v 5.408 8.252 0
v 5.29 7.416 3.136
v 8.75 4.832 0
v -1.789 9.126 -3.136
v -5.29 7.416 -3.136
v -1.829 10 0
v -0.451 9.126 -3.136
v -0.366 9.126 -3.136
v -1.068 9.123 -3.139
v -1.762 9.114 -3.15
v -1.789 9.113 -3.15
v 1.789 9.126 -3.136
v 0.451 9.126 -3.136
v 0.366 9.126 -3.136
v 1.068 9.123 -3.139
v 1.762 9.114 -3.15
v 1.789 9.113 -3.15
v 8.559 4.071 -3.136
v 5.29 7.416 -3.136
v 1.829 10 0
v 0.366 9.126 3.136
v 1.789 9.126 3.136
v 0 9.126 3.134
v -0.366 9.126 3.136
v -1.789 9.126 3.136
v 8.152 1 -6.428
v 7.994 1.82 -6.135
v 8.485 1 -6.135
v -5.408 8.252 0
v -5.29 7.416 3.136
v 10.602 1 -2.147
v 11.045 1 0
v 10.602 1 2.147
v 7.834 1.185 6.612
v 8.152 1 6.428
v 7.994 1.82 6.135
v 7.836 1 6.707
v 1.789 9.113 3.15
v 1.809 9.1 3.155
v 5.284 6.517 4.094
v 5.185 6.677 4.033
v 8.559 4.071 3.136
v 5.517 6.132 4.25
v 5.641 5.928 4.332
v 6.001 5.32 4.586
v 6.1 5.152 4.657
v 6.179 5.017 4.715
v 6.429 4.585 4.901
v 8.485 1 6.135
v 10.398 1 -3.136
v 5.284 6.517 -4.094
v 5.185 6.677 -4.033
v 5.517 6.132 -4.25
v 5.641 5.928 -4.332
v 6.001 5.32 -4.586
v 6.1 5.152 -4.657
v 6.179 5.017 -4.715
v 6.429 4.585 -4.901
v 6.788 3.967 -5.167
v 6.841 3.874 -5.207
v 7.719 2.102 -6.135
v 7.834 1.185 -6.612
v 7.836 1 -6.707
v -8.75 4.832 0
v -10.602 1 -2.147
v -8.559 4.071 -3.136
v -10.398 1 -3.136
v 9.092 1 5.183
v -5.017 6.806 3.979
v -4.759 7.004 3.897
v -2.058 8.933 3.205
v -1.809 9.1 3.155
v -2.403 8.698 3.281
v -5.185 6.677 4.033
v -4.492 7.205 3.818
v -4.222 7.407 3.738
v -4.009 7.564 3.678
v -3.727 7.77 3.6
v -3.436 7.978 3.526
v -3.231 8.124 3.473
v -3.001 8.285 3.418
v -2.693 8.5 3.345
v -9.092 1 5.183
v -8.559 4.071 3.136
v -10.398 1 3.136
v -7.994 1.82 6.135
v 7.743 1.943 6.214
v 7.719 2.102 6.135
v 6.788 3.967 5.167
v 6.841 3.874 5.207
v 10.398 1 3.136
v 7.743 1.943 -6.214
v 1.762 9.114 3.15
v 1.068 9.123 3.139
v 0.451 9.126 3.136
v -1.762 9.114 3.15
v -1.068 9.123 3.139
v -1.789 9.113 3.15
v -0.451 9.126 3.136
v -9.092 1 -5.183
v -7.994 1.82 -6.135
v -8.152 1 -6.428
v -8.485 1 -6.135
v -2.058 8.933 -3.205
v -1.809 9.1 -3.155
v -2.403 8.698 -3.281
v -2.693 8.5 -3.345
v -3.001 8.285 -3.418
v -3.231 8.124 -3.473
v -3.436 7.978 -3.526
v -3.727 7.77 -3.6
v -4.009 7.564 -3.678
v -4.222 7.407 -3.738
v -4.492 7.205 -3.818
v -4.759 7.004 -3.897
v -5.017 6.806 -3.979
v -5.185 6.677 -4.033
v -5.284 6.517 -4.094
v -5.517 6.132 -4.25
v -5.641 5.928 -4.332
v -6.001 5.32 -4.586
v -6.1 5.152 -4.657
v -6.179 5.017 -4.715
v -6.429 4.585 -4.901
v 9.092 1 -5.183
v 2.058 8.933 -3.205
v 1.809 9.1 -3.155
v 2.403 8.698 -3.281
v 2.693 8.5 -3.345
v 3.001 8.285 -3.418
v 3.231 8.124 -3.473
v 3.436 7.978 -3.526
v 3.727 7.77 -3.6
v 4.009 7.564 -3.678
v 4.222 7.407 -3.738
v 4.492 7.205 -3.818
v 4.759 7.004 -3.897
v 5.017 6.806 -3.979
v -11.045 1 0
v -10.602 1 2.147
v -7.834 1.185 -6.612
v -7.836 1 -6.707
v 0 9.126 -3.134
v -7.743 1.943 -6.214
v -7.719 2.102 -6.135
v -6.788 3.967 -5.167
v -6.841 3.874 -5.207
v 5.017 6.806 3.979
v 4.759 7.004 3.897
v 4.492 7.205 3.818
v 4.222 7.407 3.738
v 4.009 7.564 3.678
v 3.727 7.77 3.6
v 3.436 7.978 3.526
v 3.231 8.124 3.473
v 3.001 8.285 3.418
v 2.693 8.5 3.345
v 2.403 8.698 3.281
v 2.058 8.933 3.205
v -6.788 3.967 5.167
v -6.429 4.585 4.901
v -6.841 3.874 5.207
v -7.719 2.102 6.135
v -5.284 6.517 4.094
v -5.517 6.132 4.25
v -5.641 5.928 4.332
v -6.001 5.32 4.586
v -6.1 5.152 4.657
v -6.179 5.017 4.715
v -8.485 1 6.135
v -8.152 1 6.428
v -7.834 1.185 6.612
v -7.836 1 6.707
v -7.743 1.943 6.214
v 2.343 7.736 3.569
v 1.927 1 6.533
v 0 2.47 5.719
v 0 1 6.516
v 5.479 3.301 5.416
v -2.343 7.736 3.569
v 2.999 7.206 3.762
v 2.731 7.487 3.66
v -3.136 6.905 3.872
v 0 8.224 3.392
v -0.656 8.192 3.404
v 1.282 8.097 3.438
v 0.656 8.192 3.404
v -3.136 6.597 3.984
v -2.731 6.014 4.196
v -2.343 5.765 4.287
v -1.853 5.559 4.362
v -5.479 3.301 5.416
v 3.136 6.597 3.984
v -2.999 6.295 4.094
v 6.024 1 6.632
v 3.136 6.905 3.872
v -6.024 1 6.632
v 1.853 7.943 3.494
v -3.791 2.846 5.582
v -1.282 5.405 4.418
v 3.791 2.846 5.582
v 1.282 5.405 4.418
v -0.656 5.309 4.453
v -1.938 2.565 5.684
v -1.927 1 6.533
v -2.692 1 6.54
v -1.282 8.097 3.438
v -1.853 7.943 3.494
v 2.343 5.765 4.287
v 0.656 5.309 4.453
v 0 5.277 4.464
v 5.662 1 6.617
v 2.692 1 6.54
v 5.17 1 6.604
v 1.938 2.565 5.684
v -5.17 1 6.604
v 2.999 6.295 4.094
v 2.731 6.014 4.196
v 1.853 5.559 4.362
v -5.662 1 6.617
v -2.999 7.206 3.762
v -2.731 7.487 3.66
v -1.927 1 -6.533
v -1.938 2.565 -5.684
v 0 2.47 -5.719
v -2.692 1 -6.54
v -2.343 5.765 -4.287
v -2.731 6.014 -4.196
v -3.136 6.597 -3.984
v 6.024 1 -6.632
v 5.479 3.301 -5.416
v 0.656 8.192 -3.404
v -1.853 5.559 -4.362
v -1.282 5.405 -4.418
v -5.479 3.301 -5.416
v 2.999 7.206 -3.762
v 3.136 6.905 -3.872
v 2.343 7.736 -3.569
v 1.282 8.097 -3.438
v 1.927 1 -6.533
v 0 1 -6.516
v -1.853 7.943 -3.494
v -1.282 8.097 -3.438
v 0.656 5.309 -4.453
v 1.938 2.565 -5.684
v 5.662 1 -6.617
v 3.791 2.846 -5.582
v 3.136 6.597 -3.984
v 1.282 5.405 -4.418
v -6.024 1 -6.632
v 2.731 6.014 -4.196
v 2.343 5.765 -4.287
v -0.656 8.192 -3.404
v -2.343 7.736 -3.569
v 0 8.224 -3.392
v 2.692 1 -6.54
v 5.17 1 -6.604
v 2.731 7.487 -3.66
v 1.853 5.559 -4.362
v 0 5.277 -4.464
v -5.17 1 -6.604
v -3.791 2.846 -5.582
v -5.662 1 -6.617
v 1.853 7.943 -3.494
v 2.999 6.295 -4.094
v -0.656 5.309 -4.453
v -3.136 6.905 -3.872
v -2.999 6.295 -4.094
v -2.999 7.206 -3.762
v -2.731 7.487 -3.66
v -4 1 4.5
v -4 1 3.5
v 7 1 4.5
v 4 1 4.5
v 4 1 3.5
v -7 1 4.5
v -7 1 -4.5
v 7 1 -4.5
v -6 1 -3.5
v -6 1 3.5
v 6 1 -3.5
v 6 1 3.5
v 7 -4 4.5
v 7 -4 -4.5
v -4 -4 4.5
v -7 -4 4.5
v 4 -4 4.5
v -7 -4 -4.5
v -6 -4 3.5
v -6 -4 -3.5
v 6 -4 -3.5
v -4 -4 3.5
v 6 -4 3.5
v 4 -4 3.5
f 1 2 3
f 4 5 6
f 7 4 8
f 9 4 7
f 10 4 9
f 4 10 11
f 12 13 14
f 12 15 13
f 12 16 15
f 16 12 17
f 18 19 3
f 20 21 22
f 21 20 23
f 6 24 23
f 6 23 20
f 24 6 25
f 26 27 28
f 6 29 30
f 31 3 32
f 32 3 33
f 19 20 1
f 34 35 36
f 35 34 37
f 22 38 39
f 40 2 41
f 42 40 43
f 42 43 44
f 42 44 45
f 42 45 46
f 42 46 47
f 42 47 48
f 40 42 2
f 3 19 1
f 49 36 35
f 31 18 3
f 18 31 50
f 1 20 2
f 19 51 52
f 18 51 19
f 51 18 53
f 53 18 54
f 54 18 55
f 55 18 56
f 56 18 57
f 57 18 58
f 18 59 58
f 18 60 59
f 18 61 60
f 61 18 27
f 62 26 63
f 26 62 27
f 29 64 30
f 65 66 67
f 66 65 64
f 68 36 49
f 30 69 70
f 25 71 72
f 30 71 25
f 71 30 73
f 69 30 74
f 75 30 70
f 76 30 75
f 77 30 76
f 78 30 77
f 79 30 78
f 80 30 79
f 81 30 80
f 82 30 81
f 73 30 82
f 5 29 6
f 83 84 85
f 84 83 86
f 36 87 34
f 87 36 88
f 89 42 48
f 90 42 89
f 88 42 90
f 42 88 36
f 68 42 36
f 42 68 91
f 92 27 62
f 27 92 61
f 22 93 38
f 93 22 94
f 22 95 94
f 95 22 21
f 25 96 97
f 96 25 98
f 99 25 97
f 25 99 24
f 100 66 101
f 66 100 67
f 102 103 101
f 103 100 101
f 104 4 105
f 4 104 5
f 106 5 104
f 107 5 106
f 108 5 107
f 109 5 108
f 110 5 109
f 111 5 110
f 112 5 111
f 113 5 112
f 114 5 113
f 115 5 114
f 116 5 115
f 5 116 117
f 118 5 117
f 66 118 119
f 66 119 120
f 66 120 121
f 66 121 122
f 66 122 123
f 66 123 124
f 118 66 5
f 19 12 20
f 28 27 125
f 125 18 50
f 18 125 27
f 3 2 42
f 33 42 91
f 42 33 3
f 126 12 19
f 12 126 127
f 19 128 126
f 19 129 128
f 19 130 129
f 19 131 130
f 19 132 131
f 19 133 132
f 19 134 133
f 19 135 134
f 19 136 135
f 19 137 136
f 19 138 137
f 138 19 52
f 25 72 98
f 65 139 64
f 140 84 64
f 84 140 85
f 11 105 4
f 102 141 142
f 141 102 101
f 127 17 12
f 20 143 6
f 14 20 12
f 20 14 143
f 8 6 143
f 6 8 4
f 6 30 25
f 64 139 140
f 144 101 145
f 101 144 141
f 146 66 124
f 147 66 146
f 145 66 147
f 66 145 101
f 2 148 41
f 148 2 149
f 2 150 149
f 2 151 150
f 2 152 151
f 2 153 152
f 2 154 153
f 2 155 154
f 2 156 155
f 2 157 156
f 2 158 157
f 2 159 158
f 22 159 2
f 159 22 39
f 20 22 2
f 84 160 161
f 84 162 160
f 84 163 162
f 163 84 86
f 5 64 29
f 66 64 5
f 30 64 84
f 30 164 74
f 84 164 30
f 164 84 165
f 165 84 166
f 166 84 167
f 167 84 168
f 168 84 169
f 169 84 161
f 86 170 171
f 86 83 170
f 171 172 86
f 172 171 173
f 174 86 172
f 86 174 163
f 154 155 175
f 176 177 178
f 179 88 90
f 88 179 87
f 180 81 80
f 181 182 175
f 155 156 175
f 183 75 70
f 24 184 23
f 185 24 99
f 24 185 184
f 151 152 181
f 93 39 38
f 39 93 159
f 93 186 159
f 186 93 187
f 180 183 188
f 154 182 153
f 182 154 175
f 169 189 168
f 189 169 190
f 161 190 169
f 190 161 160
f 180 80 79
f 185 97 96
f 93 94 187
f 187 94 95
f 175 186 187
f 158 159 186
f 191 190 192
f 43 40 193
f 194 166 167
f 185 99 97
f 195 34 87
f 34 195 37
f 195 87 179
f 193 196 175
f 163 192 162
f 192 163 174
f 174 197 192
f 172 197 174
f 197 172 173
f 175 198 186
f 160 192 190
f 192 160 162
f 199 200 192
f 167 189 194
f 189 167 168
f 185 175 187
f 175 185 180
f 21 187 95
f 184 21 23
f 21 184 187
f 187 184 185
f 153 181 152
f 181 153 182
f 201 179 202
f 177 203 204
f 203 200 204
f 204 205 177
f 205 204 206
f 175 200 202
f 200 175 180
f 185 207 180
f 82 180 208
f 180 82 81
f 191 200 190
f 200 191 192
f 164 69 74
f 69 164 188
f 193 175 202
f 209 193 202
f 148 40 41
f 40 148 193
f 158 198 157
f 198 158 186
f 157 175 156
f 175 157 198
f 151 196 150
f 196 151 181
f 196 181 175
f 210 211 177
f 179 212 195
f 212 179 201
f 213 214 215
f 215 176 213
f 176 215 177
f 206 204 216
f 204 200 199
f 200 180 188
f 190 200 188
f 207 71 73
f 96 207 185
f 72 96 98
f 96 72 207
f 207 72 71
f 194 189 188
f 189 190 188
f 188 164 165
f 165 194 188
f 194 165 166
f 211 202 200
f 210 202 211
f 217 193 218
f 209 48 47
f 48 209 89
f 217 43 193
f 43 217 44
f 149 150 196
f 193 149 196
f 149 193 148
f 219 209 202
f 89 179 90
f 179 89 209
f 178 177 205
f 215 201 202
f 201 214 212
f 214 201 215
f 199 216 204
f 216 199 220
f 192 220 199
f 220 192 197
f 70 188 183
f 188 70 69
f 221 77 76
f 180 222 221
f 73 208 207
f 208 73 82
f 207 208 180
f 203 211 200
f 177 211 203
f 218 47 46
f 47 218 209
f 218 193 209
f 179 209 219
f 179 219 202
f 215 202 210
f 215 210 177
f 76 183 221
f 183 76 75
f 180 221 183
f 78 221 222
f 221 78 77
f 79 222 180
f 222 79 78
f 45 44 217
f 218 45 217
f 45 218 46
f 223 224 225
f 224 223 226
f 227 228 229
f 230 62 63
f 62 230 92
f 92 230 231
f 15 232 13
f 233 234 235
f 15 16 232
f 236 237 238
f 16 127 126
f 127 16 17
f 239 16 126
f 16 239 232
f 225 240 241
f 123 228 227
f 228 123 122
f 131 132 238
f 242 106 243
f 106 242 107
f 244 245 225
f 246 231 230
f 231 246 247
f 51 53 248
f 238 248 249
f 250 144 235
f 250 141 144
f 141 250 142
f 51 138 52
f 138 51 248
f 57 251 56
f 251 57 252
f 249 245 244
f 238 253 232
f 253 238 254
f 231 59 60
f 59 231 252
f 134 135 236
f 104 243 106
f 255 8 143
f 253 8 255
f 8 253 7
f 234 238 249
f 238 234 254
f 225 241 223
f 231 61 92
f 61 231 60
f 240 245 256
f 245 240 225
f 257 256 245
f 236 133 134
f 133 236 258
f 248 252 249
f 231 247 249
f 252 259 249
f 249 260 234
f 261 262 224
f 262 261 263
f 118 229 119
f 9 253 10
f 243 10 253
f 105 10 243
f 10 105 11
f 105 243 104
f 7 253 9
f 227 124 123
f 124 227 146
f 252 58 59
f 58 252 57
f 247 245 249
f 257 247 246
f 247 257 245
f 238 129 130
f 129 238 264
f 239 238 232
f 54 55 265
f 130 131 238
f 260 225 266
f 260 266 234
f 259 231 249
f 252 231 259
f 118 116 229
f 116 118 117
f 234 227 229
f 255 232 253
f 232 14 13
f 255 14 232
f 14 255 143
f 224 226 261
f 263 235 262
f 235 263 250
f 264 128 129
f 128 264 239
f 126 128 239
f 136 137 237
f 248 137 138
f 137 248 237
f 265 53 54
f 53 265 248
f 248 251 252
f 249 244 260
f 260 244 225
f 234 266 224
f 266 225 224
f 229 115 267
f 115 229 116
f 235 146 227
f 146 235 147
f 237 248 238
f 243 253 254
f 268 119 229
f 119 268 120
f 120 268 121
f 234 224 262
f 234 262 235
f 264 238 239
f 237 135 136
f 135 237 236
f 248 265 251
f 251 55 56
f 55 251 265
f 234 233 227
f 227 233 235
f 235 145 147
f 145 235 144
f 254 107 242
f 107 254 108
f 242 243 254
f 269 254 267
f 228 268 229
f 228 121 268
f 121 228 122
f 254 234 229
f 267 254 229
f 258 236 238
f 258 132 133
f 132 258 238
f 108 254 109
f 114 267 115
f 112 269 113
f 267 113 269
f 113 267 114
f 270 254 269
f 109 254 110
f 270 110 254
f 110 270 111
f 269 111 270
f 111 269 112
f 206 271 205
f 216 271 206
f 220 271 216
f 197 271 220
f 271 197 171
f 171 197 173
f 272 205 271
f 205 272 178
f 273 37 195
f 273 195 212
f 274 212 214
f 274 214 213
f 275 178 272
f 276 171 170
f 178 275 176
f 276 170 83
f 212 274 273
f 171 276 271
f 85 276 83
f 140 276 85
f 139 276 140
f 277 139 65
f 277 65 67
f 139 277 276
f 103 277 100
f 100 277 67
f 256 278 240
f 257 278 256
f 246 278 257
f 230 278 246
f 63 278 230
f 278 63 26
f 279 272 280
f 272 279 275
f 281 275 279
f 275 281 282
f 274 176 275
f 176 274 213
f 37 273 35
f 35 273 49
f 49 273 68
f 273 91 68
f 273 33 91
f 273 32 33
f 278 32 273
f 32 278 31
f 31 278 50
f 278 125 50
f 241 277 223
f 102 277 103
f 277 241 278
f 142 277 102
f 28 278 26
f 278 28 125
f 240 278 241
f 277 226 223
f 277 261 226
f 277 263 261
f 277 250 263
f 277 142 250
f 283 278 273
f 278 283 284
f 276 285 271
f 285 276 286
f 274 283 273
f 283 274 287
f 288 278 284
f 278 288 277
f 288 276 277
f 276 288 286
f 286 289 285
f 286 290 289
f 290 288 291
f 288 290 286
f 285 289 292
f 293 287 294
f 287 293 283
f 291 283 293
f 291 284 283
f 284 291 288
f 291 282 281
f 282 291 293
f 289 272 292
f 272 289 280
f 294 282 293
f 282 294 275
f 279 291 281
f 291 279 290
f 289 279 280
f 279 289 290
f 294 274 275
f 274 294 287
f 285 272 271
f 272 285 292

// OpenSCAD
//#import("c:/misc/network_switch_port_cover.stl");
$fn=30;


difference(){
	translate([0,-30,0]) resize(newsize=[35,80,30]) sphere(d=100);
	rotate([0,20,90]) translate([5,0,11]) resize(newsize=[30,60,10]) sphere(r=10); 
	mirror(v= [0, 0, 180] ) rotate([0,20,90]) translate([5,0,11]) resize(newsize=[30,60,10]) sphere(r=10); 
	translate([0,-49,0]) cube([100,100,100],center=true);
}

Base();


module Base(){
	difference(){
		cube([14,8,9],center=true);
		translate([0,-2,0]) cube([12,8,7],center=true);
		translate([0,-2,4]) cube([8,6,8],center=true);
	}
}
//resize(newsize=[20,10,12])
